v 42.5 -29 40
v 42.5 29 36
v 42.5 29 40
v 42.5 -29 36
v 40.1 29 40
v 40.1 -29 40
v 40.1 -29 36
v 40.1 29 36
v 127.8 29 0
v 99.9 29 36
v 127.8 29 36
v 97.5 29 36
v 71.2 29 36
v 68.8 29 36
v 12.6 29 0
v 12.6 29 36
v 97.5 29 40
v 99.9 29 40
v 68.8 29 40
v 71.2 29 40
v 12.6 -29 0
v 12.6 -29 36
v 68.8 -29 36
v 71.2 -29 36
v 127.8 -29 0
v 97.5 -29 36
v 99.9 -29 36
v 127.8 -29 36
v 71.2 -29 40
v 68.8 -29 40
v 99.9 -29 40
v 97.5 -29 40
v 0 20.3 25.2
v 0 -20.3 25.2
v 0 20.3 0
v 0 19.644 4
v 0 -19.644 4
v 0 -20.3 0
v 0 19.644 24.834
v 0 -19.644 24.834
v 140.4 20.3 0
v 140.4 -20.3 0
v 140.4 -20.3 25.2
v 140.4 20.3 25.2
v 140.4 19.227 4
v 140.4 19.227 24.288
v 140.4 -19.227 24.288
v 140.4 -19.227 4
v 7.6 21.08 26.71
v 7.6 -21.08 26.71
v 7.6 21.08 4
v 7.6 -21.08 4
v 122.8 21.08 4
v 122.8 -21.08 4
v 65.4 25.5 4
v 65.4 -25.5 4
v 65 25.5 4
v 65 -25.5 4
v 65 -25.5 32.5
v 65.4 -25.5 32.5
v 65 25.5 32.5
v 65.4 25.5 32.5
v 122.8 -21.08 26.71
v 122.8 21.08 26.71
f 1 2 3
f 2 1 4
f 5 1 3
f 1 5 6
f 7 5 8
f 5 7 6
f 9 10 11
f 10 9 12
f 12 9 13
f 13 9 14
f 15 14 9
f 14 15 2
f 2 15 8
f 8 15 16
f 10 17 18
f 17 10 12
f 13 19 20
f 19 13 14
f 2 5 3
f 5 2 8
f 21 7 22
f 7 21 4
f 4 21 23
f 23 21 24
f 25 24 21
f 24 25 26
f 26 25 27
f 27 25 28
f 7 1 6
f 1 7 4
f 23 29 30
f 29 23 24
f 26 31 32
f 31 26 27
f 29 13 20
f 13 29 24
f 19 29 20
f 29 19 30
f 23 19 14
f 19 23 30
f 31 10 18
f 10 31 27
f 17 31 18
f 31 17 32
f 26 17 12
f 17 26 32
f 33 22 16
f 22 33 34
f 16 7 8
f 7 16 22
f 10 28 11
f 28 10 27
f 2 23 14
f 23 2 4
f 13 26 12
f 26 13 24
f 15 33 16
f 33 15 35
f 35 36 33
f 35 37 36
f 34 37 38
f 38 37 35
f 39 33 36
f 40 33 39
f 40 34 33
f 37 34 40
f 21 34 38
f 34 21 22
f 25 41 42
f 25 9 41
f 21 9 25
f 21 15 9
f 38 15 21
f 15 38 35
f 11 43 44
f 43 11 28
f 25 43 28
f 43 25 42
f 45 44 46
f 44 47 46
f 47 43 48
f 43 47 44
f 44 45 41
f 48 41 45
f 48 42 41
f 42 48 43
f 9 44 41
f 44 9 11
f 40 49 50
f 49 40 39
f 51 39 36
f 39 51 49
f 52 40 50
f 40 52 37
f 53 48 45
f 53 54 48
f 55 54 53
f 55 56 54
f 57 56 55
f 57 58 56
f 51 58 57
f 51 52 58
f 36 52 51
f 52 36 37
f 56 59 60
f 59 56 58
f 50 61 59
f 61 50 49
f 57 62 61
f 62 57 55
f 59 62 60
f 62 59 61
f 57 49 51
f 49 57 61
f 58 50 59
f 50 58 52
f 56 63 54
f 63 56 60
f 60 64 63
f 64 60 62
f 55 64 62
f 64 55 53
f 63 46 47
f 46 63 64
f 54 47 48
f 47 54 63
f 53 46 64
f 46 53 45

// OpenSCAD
$fn = 32;

// ----------------------------------------------------------------------
// Faired channel: 140 x 58 x 36 mm, 3.5 mm walls, faired ends
// ----------------------------------------------------------------------

// --- parameters (mm) ---
length = 140;             // channel length
width = 58;               // channel width at mid length
height = 36;              // channel height at mid length
wall = 3.5;               // side wall thickness
floor_t = 4;              // floor thickness
end_w = 40.6;             // faired end width
end_h = 25.2;             // faired end height
ribs = 3;                 // stiffening ribs on the top
rib_t = 2.4;              // rib thickness
rib_h = 4;                // rib height

difference() {
  union() {
    hull() {
      translate([0, -20.3, 0]) cube([0.4, 40.6, 25.2]);
      translate([12.6, -29, 0]) cube([0.4, 58, 36]);
    }
    hull() {
      translate([12.6, -29, 0]) cube([0.4, 58, 36]);
      translate([70, -29, 0]) cube([0.4, 58, 36]);
    }
    hull() {
      translate([70, -29, 0]) cube([0.4, 58, 36]);
      translate([127.4, -29, 0]) cube([0.4, 58, 36]);
    }
    hull() {
      translate([127.4, -29, 0]) cube([0.4, 58, 36]);
      translate([140, -20.3, 0]) cube([0.4, 40.6, 25.2]);
    }
    /* stiffening ribs across the flat top, sunk 0.8 mm into it */
    for (i = [1 : ribs]) {
      translate([12.6 + i * (length - 2 * 12.6) / (ribs + 1) - rib_t / 2, -width / 2, height - 0.8]) cube([rib_t, width, rib_h + 0.8]);
    }
  }
  /* cavity, 5 mm proud of both ends so the ports are cut clean */
  hull() {
    translate([-5, -18.7, 4]) cube([0.4, 37.4, 19.6]);
    translate([7.6, -21.08, 4]) cube([0.4, 42.16, 22.71]);
  }
  hull() {
    translate([7.6, -21.08, 4]) cube([0.4, 42.16, 22.71]);
    translate([65, -25.5, 4]) cube([0.4, 51, 28.5]);
  }
  hull() {
    translate([65, -25.5, 4]) cube([0.4, 51, 28.5]);
    translate([122.4, -21.08, 4]) cube([0.4, 42.16, 22.71]);
  }
  hull() {
    translate([122.4, -21.08, 4]) cube([0.4, 42.16, 22.71]);
    translate([145, -18.7, 4]) cube([0.4, 37.4, 19.6]);
  }
}
